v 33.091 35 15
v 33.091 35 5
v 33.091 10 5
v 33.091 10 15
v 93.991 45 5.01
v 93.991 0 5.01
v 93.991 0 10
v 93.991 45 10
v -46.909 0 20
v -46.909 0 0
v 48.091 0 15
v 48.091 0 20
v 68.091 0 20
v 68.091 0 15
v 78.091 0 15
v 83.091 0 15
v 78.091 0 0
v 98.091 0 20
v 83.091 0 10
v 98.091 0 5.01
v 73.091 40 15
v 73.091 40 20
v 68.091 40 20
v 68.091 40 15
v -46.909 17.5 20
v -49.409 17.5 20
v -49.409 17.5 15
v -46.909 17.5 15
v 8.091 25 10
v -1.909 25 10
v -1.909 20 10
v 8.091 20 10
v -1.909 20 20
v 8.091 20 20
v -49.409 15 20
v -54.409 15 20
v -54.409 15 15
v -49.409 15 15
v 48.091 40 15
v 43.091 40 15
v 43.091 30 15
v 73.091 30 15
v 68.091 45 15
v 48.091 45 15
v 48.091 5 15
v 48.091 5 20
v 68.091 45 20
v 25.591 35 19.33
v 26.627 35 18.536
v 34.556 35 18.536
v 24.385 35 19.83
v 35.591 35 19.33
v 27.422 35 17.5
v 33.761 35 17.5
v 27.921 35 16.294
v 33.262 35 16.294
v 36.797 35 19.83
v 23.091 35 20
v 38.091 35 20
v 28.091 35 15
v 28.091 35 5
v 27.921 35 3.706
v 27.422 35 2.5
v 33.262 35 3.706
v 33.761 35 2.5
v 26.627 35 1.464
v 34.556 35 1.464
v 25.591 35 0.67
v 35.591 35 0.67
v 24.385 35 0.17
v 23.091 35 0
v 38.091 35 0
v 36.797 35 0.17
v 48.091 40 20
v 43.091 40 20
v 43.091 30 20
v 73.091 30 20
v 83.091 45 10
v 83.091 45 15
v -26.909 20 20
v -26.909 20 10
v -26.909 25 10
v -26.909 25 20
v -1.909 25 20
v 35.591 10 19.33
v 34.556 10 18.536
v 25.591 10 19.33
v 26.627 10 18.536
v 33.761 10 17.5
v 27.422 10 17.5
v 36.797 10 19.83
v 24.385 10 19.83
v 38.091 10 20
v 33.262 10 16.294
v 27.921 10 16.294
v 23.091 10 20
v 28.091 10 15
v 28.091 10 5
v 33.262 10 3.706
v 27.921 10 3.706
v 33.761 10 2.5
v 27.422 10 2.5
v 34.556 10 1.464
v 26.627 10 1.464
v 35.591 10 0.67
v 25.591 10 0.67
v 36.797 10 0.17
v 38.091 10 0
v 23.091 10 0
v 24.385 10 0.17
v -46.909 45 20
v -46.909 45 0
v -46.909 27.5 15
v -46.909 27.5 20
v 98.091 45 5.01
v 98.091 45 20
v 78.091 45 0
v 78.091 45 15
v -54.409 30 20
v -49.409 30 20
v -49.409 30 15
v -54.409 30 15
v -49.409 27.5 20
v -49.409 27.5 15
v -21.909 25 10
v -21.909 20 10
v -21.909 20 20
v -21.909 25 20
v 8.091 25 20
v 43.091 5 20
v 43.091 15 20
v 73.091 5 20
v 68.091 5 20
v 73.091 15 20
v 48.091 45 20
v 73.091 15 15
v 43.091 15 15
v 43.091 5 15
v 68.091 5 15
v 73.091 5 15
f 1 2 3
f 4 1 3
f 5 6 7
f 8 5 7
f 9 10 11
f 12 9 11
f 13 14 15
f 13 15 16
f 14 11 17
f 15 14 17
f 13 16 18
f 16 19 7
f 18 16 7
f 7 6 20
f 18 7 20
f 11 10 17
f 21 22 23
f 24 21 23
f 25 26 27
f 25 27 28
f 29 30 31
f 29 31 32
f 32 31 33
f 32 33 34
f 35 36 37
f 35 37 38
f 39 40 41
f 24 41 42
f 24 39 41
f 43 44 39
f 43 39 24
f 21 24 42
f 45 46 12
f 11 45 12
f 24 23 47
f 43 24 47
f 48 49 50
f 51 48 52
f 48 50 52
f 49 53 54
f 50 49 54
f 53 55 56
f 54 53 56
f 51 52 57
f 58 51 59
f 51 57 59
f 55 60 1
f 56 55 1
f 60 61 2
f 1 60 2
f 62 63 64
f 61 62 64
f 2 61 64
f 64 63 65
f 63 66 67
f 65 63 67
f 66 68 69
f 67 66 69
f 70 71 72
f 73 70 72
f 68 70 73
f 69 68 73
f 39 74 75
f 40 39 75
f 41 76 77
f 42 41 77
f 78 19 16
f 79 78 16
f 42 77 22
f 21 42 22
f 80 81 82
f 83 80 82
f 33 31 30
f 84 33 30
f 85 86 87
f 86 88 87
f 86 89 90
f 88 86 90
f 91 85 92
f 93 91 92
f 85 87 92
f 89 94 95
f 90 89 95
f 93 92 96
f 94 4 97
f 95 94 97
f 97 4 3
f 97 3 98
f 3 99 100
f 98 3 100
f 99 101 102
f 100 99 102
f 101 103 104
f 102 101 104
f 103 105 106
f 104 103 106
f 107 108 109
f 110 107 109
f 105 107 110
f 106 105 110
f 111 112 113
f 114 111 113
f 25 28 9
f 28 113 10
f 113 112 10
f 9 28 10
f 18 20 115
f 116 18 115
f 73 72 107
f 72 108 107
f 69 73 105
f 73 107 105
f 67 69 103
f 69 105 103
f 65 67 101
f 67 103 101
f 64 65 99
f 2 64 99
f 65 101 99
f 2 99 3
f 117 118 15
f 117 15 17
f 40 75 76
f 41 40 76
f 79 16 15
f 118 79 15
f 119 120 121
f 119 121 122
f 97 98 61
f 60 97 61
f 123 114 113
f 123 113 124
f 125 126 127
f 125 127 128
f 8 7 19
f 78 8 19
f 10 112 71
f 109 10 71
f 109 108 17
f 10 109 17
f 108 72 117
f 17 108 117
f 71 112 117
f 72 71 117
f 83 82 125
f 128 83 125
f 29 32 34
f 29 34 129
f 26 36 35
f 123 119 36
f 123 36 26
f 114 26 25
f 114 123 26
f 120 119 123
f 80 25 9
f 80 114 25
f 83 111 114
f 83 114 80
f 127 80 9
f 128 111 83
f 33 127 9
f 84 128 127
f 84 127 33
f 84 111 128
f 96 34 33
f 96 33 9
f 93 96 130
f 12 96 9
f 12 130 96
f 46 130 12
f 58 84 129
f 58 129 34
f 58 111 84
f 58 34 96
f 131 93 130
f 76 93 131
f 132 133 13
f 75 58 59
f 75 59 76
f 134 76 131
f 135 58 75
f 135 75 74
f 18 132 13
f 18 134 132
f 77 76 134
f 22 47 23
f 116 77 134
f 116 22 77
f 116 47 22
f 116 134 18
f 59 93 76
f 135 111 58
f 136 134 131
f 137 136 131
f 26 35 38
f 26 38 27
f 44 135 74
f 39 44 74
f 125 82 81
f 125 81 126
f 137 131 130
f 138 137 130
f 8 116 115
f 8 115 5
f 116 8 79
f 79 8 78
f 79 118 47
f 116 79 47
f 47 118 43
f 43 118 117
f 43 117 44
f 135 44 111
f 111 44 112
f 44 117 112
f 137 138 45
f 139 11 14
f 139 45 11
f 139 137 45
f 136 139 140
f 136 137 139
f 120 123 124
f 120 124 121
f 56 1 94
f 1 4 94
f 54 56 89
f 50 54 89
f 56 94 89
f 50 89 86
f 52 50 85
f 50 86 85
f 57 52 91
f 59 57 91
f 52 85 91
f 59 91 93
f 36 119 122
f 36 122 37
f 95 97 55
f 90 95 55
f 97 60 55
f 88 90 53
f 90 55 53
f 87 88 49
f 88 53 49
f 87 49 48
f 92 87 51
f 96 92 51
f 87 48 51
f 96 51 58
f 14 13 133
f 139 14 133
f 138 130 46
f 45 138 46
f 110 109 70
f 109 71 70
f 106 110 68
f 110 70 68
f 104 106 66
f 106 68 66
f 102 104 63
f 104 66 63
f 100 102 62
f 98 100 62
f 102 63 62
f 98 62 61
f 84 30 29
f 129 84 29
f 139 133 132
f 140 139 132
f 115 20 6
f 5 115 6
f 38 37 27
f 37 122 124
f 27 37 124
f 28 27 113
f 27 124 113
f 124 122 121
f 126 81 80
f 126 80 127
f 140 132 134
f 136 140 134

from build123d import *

# Parameters (mm, degrees)
F0_W     = 5
F0_H     = 5
F0_W_2   = 10
F1_DEPTH = 20
F2_DEPTH = 10
F3_R     = 5
F5_DEPTH = 5
F7_DEPTH = 50
F9_DEPTH = 5


with BuildPart() as f1:
    # F0 (on Top) → F1 (new body)
    with BuildSketch(Plane.XY):
        Polygon((-46.9086258113, 17.5), (-46.9086258113, 0), (98.0913741887, 0), (98.0913741887, 45), (-46.9086258113, 45), (-46.9086258113, 27.5), align=None)
        with Locations((-24.4086258113, 22.5)):
            Rectangle(F0_W, F0_H, mode=Mode.SUBTRACT)
        with Locations((3.0913741887, 22.5)):
            Rectangle(F0_W_2, F0_H, mode=Mode.SUBTRACT)
        Polygon((28.0913741887, 10), (28.0913741887, 25), (28.0913741887, 35), (33.0913741887, 35), (33.0913741887, 10), align=None, mode=Mode.SUBTRACT)
    extrude(amount=F1_DEPTH)

    # F0 (on Top) → F2 (join)
    with BuildSketch(Plane.XY):
        with Locations((-24.4086258113, 22.5)):
            Rectangle(F0_W, F0_H)
        with Locations((3.0913741887, 22.5)):
            Rectangle(F0_W_2, F0_H)
    extrude(amount=F2_DEPTH)

    # F3
    f3_edges = [f1.edges().sort_by_distance(p)[0] for p in [
        (33.091374, 22.5, 20),
        (28.091374, 22.5, 20),
        (28.091374, 22.5, 0),
        (33.091374, 22.5, 0),
    ]]
    fillet(f3_edges, radius=F3_R)

    # F4 (on face) → F5 (join)
    with BuildSketch(Plane.XY.offset(20)):
        Polygon((-46.9086258113, 17.5), (-46.9086258113, 27.5), (-49.4086258113, 27.5), (-49.4086258113, 30), (-54.4086258113, 30), (-54.4086258113, 15), (-49.4086258113, 15), (-49.4086258113, 17.5), align=None)
    extrude(amount=-F5_DEPTH)

    # F6 (on face) → F7 (cut)
    with BuildSketch(Plane.XZ):
        Polygon((93.9913741887, 10), (83.0913741887, 10), (83.0913741887, 15), (78.0913741887, 15), (78.0913741887, 0), (98.0913741887, 0), (98.0913741887, 5.01), (93.9913741887, 5.01), align=None)
    extrude(amount=-F7_DEPTH, mode=Mode.SUBTRACT)

    # F8 (on face) → F9 (cut)
    with BuildSketch(Plane.XY.offset(20)):
        Polygon((48.0913741887, 0), (68.0913741887, 0), (68.0913741887, 5), (73.0913741887, 5), (73.0913741887, 15), (43.0913741887, 15), (43.0913741887, 5), (48.0913741887, 5), align=None)
        Polygon((68.0913741887, 40), (68.0913741887, 45), (48.0913741887, 45), (48.0913741887, 40), (43.0913741887, 40), (43.0913741887, 30), (73.0913741887, 30), (73.0913741887, 40), align=None)
    extrude(amount=-F9_DEPTH, mode=Mode.SUBTRACT)


solid = f1.part
